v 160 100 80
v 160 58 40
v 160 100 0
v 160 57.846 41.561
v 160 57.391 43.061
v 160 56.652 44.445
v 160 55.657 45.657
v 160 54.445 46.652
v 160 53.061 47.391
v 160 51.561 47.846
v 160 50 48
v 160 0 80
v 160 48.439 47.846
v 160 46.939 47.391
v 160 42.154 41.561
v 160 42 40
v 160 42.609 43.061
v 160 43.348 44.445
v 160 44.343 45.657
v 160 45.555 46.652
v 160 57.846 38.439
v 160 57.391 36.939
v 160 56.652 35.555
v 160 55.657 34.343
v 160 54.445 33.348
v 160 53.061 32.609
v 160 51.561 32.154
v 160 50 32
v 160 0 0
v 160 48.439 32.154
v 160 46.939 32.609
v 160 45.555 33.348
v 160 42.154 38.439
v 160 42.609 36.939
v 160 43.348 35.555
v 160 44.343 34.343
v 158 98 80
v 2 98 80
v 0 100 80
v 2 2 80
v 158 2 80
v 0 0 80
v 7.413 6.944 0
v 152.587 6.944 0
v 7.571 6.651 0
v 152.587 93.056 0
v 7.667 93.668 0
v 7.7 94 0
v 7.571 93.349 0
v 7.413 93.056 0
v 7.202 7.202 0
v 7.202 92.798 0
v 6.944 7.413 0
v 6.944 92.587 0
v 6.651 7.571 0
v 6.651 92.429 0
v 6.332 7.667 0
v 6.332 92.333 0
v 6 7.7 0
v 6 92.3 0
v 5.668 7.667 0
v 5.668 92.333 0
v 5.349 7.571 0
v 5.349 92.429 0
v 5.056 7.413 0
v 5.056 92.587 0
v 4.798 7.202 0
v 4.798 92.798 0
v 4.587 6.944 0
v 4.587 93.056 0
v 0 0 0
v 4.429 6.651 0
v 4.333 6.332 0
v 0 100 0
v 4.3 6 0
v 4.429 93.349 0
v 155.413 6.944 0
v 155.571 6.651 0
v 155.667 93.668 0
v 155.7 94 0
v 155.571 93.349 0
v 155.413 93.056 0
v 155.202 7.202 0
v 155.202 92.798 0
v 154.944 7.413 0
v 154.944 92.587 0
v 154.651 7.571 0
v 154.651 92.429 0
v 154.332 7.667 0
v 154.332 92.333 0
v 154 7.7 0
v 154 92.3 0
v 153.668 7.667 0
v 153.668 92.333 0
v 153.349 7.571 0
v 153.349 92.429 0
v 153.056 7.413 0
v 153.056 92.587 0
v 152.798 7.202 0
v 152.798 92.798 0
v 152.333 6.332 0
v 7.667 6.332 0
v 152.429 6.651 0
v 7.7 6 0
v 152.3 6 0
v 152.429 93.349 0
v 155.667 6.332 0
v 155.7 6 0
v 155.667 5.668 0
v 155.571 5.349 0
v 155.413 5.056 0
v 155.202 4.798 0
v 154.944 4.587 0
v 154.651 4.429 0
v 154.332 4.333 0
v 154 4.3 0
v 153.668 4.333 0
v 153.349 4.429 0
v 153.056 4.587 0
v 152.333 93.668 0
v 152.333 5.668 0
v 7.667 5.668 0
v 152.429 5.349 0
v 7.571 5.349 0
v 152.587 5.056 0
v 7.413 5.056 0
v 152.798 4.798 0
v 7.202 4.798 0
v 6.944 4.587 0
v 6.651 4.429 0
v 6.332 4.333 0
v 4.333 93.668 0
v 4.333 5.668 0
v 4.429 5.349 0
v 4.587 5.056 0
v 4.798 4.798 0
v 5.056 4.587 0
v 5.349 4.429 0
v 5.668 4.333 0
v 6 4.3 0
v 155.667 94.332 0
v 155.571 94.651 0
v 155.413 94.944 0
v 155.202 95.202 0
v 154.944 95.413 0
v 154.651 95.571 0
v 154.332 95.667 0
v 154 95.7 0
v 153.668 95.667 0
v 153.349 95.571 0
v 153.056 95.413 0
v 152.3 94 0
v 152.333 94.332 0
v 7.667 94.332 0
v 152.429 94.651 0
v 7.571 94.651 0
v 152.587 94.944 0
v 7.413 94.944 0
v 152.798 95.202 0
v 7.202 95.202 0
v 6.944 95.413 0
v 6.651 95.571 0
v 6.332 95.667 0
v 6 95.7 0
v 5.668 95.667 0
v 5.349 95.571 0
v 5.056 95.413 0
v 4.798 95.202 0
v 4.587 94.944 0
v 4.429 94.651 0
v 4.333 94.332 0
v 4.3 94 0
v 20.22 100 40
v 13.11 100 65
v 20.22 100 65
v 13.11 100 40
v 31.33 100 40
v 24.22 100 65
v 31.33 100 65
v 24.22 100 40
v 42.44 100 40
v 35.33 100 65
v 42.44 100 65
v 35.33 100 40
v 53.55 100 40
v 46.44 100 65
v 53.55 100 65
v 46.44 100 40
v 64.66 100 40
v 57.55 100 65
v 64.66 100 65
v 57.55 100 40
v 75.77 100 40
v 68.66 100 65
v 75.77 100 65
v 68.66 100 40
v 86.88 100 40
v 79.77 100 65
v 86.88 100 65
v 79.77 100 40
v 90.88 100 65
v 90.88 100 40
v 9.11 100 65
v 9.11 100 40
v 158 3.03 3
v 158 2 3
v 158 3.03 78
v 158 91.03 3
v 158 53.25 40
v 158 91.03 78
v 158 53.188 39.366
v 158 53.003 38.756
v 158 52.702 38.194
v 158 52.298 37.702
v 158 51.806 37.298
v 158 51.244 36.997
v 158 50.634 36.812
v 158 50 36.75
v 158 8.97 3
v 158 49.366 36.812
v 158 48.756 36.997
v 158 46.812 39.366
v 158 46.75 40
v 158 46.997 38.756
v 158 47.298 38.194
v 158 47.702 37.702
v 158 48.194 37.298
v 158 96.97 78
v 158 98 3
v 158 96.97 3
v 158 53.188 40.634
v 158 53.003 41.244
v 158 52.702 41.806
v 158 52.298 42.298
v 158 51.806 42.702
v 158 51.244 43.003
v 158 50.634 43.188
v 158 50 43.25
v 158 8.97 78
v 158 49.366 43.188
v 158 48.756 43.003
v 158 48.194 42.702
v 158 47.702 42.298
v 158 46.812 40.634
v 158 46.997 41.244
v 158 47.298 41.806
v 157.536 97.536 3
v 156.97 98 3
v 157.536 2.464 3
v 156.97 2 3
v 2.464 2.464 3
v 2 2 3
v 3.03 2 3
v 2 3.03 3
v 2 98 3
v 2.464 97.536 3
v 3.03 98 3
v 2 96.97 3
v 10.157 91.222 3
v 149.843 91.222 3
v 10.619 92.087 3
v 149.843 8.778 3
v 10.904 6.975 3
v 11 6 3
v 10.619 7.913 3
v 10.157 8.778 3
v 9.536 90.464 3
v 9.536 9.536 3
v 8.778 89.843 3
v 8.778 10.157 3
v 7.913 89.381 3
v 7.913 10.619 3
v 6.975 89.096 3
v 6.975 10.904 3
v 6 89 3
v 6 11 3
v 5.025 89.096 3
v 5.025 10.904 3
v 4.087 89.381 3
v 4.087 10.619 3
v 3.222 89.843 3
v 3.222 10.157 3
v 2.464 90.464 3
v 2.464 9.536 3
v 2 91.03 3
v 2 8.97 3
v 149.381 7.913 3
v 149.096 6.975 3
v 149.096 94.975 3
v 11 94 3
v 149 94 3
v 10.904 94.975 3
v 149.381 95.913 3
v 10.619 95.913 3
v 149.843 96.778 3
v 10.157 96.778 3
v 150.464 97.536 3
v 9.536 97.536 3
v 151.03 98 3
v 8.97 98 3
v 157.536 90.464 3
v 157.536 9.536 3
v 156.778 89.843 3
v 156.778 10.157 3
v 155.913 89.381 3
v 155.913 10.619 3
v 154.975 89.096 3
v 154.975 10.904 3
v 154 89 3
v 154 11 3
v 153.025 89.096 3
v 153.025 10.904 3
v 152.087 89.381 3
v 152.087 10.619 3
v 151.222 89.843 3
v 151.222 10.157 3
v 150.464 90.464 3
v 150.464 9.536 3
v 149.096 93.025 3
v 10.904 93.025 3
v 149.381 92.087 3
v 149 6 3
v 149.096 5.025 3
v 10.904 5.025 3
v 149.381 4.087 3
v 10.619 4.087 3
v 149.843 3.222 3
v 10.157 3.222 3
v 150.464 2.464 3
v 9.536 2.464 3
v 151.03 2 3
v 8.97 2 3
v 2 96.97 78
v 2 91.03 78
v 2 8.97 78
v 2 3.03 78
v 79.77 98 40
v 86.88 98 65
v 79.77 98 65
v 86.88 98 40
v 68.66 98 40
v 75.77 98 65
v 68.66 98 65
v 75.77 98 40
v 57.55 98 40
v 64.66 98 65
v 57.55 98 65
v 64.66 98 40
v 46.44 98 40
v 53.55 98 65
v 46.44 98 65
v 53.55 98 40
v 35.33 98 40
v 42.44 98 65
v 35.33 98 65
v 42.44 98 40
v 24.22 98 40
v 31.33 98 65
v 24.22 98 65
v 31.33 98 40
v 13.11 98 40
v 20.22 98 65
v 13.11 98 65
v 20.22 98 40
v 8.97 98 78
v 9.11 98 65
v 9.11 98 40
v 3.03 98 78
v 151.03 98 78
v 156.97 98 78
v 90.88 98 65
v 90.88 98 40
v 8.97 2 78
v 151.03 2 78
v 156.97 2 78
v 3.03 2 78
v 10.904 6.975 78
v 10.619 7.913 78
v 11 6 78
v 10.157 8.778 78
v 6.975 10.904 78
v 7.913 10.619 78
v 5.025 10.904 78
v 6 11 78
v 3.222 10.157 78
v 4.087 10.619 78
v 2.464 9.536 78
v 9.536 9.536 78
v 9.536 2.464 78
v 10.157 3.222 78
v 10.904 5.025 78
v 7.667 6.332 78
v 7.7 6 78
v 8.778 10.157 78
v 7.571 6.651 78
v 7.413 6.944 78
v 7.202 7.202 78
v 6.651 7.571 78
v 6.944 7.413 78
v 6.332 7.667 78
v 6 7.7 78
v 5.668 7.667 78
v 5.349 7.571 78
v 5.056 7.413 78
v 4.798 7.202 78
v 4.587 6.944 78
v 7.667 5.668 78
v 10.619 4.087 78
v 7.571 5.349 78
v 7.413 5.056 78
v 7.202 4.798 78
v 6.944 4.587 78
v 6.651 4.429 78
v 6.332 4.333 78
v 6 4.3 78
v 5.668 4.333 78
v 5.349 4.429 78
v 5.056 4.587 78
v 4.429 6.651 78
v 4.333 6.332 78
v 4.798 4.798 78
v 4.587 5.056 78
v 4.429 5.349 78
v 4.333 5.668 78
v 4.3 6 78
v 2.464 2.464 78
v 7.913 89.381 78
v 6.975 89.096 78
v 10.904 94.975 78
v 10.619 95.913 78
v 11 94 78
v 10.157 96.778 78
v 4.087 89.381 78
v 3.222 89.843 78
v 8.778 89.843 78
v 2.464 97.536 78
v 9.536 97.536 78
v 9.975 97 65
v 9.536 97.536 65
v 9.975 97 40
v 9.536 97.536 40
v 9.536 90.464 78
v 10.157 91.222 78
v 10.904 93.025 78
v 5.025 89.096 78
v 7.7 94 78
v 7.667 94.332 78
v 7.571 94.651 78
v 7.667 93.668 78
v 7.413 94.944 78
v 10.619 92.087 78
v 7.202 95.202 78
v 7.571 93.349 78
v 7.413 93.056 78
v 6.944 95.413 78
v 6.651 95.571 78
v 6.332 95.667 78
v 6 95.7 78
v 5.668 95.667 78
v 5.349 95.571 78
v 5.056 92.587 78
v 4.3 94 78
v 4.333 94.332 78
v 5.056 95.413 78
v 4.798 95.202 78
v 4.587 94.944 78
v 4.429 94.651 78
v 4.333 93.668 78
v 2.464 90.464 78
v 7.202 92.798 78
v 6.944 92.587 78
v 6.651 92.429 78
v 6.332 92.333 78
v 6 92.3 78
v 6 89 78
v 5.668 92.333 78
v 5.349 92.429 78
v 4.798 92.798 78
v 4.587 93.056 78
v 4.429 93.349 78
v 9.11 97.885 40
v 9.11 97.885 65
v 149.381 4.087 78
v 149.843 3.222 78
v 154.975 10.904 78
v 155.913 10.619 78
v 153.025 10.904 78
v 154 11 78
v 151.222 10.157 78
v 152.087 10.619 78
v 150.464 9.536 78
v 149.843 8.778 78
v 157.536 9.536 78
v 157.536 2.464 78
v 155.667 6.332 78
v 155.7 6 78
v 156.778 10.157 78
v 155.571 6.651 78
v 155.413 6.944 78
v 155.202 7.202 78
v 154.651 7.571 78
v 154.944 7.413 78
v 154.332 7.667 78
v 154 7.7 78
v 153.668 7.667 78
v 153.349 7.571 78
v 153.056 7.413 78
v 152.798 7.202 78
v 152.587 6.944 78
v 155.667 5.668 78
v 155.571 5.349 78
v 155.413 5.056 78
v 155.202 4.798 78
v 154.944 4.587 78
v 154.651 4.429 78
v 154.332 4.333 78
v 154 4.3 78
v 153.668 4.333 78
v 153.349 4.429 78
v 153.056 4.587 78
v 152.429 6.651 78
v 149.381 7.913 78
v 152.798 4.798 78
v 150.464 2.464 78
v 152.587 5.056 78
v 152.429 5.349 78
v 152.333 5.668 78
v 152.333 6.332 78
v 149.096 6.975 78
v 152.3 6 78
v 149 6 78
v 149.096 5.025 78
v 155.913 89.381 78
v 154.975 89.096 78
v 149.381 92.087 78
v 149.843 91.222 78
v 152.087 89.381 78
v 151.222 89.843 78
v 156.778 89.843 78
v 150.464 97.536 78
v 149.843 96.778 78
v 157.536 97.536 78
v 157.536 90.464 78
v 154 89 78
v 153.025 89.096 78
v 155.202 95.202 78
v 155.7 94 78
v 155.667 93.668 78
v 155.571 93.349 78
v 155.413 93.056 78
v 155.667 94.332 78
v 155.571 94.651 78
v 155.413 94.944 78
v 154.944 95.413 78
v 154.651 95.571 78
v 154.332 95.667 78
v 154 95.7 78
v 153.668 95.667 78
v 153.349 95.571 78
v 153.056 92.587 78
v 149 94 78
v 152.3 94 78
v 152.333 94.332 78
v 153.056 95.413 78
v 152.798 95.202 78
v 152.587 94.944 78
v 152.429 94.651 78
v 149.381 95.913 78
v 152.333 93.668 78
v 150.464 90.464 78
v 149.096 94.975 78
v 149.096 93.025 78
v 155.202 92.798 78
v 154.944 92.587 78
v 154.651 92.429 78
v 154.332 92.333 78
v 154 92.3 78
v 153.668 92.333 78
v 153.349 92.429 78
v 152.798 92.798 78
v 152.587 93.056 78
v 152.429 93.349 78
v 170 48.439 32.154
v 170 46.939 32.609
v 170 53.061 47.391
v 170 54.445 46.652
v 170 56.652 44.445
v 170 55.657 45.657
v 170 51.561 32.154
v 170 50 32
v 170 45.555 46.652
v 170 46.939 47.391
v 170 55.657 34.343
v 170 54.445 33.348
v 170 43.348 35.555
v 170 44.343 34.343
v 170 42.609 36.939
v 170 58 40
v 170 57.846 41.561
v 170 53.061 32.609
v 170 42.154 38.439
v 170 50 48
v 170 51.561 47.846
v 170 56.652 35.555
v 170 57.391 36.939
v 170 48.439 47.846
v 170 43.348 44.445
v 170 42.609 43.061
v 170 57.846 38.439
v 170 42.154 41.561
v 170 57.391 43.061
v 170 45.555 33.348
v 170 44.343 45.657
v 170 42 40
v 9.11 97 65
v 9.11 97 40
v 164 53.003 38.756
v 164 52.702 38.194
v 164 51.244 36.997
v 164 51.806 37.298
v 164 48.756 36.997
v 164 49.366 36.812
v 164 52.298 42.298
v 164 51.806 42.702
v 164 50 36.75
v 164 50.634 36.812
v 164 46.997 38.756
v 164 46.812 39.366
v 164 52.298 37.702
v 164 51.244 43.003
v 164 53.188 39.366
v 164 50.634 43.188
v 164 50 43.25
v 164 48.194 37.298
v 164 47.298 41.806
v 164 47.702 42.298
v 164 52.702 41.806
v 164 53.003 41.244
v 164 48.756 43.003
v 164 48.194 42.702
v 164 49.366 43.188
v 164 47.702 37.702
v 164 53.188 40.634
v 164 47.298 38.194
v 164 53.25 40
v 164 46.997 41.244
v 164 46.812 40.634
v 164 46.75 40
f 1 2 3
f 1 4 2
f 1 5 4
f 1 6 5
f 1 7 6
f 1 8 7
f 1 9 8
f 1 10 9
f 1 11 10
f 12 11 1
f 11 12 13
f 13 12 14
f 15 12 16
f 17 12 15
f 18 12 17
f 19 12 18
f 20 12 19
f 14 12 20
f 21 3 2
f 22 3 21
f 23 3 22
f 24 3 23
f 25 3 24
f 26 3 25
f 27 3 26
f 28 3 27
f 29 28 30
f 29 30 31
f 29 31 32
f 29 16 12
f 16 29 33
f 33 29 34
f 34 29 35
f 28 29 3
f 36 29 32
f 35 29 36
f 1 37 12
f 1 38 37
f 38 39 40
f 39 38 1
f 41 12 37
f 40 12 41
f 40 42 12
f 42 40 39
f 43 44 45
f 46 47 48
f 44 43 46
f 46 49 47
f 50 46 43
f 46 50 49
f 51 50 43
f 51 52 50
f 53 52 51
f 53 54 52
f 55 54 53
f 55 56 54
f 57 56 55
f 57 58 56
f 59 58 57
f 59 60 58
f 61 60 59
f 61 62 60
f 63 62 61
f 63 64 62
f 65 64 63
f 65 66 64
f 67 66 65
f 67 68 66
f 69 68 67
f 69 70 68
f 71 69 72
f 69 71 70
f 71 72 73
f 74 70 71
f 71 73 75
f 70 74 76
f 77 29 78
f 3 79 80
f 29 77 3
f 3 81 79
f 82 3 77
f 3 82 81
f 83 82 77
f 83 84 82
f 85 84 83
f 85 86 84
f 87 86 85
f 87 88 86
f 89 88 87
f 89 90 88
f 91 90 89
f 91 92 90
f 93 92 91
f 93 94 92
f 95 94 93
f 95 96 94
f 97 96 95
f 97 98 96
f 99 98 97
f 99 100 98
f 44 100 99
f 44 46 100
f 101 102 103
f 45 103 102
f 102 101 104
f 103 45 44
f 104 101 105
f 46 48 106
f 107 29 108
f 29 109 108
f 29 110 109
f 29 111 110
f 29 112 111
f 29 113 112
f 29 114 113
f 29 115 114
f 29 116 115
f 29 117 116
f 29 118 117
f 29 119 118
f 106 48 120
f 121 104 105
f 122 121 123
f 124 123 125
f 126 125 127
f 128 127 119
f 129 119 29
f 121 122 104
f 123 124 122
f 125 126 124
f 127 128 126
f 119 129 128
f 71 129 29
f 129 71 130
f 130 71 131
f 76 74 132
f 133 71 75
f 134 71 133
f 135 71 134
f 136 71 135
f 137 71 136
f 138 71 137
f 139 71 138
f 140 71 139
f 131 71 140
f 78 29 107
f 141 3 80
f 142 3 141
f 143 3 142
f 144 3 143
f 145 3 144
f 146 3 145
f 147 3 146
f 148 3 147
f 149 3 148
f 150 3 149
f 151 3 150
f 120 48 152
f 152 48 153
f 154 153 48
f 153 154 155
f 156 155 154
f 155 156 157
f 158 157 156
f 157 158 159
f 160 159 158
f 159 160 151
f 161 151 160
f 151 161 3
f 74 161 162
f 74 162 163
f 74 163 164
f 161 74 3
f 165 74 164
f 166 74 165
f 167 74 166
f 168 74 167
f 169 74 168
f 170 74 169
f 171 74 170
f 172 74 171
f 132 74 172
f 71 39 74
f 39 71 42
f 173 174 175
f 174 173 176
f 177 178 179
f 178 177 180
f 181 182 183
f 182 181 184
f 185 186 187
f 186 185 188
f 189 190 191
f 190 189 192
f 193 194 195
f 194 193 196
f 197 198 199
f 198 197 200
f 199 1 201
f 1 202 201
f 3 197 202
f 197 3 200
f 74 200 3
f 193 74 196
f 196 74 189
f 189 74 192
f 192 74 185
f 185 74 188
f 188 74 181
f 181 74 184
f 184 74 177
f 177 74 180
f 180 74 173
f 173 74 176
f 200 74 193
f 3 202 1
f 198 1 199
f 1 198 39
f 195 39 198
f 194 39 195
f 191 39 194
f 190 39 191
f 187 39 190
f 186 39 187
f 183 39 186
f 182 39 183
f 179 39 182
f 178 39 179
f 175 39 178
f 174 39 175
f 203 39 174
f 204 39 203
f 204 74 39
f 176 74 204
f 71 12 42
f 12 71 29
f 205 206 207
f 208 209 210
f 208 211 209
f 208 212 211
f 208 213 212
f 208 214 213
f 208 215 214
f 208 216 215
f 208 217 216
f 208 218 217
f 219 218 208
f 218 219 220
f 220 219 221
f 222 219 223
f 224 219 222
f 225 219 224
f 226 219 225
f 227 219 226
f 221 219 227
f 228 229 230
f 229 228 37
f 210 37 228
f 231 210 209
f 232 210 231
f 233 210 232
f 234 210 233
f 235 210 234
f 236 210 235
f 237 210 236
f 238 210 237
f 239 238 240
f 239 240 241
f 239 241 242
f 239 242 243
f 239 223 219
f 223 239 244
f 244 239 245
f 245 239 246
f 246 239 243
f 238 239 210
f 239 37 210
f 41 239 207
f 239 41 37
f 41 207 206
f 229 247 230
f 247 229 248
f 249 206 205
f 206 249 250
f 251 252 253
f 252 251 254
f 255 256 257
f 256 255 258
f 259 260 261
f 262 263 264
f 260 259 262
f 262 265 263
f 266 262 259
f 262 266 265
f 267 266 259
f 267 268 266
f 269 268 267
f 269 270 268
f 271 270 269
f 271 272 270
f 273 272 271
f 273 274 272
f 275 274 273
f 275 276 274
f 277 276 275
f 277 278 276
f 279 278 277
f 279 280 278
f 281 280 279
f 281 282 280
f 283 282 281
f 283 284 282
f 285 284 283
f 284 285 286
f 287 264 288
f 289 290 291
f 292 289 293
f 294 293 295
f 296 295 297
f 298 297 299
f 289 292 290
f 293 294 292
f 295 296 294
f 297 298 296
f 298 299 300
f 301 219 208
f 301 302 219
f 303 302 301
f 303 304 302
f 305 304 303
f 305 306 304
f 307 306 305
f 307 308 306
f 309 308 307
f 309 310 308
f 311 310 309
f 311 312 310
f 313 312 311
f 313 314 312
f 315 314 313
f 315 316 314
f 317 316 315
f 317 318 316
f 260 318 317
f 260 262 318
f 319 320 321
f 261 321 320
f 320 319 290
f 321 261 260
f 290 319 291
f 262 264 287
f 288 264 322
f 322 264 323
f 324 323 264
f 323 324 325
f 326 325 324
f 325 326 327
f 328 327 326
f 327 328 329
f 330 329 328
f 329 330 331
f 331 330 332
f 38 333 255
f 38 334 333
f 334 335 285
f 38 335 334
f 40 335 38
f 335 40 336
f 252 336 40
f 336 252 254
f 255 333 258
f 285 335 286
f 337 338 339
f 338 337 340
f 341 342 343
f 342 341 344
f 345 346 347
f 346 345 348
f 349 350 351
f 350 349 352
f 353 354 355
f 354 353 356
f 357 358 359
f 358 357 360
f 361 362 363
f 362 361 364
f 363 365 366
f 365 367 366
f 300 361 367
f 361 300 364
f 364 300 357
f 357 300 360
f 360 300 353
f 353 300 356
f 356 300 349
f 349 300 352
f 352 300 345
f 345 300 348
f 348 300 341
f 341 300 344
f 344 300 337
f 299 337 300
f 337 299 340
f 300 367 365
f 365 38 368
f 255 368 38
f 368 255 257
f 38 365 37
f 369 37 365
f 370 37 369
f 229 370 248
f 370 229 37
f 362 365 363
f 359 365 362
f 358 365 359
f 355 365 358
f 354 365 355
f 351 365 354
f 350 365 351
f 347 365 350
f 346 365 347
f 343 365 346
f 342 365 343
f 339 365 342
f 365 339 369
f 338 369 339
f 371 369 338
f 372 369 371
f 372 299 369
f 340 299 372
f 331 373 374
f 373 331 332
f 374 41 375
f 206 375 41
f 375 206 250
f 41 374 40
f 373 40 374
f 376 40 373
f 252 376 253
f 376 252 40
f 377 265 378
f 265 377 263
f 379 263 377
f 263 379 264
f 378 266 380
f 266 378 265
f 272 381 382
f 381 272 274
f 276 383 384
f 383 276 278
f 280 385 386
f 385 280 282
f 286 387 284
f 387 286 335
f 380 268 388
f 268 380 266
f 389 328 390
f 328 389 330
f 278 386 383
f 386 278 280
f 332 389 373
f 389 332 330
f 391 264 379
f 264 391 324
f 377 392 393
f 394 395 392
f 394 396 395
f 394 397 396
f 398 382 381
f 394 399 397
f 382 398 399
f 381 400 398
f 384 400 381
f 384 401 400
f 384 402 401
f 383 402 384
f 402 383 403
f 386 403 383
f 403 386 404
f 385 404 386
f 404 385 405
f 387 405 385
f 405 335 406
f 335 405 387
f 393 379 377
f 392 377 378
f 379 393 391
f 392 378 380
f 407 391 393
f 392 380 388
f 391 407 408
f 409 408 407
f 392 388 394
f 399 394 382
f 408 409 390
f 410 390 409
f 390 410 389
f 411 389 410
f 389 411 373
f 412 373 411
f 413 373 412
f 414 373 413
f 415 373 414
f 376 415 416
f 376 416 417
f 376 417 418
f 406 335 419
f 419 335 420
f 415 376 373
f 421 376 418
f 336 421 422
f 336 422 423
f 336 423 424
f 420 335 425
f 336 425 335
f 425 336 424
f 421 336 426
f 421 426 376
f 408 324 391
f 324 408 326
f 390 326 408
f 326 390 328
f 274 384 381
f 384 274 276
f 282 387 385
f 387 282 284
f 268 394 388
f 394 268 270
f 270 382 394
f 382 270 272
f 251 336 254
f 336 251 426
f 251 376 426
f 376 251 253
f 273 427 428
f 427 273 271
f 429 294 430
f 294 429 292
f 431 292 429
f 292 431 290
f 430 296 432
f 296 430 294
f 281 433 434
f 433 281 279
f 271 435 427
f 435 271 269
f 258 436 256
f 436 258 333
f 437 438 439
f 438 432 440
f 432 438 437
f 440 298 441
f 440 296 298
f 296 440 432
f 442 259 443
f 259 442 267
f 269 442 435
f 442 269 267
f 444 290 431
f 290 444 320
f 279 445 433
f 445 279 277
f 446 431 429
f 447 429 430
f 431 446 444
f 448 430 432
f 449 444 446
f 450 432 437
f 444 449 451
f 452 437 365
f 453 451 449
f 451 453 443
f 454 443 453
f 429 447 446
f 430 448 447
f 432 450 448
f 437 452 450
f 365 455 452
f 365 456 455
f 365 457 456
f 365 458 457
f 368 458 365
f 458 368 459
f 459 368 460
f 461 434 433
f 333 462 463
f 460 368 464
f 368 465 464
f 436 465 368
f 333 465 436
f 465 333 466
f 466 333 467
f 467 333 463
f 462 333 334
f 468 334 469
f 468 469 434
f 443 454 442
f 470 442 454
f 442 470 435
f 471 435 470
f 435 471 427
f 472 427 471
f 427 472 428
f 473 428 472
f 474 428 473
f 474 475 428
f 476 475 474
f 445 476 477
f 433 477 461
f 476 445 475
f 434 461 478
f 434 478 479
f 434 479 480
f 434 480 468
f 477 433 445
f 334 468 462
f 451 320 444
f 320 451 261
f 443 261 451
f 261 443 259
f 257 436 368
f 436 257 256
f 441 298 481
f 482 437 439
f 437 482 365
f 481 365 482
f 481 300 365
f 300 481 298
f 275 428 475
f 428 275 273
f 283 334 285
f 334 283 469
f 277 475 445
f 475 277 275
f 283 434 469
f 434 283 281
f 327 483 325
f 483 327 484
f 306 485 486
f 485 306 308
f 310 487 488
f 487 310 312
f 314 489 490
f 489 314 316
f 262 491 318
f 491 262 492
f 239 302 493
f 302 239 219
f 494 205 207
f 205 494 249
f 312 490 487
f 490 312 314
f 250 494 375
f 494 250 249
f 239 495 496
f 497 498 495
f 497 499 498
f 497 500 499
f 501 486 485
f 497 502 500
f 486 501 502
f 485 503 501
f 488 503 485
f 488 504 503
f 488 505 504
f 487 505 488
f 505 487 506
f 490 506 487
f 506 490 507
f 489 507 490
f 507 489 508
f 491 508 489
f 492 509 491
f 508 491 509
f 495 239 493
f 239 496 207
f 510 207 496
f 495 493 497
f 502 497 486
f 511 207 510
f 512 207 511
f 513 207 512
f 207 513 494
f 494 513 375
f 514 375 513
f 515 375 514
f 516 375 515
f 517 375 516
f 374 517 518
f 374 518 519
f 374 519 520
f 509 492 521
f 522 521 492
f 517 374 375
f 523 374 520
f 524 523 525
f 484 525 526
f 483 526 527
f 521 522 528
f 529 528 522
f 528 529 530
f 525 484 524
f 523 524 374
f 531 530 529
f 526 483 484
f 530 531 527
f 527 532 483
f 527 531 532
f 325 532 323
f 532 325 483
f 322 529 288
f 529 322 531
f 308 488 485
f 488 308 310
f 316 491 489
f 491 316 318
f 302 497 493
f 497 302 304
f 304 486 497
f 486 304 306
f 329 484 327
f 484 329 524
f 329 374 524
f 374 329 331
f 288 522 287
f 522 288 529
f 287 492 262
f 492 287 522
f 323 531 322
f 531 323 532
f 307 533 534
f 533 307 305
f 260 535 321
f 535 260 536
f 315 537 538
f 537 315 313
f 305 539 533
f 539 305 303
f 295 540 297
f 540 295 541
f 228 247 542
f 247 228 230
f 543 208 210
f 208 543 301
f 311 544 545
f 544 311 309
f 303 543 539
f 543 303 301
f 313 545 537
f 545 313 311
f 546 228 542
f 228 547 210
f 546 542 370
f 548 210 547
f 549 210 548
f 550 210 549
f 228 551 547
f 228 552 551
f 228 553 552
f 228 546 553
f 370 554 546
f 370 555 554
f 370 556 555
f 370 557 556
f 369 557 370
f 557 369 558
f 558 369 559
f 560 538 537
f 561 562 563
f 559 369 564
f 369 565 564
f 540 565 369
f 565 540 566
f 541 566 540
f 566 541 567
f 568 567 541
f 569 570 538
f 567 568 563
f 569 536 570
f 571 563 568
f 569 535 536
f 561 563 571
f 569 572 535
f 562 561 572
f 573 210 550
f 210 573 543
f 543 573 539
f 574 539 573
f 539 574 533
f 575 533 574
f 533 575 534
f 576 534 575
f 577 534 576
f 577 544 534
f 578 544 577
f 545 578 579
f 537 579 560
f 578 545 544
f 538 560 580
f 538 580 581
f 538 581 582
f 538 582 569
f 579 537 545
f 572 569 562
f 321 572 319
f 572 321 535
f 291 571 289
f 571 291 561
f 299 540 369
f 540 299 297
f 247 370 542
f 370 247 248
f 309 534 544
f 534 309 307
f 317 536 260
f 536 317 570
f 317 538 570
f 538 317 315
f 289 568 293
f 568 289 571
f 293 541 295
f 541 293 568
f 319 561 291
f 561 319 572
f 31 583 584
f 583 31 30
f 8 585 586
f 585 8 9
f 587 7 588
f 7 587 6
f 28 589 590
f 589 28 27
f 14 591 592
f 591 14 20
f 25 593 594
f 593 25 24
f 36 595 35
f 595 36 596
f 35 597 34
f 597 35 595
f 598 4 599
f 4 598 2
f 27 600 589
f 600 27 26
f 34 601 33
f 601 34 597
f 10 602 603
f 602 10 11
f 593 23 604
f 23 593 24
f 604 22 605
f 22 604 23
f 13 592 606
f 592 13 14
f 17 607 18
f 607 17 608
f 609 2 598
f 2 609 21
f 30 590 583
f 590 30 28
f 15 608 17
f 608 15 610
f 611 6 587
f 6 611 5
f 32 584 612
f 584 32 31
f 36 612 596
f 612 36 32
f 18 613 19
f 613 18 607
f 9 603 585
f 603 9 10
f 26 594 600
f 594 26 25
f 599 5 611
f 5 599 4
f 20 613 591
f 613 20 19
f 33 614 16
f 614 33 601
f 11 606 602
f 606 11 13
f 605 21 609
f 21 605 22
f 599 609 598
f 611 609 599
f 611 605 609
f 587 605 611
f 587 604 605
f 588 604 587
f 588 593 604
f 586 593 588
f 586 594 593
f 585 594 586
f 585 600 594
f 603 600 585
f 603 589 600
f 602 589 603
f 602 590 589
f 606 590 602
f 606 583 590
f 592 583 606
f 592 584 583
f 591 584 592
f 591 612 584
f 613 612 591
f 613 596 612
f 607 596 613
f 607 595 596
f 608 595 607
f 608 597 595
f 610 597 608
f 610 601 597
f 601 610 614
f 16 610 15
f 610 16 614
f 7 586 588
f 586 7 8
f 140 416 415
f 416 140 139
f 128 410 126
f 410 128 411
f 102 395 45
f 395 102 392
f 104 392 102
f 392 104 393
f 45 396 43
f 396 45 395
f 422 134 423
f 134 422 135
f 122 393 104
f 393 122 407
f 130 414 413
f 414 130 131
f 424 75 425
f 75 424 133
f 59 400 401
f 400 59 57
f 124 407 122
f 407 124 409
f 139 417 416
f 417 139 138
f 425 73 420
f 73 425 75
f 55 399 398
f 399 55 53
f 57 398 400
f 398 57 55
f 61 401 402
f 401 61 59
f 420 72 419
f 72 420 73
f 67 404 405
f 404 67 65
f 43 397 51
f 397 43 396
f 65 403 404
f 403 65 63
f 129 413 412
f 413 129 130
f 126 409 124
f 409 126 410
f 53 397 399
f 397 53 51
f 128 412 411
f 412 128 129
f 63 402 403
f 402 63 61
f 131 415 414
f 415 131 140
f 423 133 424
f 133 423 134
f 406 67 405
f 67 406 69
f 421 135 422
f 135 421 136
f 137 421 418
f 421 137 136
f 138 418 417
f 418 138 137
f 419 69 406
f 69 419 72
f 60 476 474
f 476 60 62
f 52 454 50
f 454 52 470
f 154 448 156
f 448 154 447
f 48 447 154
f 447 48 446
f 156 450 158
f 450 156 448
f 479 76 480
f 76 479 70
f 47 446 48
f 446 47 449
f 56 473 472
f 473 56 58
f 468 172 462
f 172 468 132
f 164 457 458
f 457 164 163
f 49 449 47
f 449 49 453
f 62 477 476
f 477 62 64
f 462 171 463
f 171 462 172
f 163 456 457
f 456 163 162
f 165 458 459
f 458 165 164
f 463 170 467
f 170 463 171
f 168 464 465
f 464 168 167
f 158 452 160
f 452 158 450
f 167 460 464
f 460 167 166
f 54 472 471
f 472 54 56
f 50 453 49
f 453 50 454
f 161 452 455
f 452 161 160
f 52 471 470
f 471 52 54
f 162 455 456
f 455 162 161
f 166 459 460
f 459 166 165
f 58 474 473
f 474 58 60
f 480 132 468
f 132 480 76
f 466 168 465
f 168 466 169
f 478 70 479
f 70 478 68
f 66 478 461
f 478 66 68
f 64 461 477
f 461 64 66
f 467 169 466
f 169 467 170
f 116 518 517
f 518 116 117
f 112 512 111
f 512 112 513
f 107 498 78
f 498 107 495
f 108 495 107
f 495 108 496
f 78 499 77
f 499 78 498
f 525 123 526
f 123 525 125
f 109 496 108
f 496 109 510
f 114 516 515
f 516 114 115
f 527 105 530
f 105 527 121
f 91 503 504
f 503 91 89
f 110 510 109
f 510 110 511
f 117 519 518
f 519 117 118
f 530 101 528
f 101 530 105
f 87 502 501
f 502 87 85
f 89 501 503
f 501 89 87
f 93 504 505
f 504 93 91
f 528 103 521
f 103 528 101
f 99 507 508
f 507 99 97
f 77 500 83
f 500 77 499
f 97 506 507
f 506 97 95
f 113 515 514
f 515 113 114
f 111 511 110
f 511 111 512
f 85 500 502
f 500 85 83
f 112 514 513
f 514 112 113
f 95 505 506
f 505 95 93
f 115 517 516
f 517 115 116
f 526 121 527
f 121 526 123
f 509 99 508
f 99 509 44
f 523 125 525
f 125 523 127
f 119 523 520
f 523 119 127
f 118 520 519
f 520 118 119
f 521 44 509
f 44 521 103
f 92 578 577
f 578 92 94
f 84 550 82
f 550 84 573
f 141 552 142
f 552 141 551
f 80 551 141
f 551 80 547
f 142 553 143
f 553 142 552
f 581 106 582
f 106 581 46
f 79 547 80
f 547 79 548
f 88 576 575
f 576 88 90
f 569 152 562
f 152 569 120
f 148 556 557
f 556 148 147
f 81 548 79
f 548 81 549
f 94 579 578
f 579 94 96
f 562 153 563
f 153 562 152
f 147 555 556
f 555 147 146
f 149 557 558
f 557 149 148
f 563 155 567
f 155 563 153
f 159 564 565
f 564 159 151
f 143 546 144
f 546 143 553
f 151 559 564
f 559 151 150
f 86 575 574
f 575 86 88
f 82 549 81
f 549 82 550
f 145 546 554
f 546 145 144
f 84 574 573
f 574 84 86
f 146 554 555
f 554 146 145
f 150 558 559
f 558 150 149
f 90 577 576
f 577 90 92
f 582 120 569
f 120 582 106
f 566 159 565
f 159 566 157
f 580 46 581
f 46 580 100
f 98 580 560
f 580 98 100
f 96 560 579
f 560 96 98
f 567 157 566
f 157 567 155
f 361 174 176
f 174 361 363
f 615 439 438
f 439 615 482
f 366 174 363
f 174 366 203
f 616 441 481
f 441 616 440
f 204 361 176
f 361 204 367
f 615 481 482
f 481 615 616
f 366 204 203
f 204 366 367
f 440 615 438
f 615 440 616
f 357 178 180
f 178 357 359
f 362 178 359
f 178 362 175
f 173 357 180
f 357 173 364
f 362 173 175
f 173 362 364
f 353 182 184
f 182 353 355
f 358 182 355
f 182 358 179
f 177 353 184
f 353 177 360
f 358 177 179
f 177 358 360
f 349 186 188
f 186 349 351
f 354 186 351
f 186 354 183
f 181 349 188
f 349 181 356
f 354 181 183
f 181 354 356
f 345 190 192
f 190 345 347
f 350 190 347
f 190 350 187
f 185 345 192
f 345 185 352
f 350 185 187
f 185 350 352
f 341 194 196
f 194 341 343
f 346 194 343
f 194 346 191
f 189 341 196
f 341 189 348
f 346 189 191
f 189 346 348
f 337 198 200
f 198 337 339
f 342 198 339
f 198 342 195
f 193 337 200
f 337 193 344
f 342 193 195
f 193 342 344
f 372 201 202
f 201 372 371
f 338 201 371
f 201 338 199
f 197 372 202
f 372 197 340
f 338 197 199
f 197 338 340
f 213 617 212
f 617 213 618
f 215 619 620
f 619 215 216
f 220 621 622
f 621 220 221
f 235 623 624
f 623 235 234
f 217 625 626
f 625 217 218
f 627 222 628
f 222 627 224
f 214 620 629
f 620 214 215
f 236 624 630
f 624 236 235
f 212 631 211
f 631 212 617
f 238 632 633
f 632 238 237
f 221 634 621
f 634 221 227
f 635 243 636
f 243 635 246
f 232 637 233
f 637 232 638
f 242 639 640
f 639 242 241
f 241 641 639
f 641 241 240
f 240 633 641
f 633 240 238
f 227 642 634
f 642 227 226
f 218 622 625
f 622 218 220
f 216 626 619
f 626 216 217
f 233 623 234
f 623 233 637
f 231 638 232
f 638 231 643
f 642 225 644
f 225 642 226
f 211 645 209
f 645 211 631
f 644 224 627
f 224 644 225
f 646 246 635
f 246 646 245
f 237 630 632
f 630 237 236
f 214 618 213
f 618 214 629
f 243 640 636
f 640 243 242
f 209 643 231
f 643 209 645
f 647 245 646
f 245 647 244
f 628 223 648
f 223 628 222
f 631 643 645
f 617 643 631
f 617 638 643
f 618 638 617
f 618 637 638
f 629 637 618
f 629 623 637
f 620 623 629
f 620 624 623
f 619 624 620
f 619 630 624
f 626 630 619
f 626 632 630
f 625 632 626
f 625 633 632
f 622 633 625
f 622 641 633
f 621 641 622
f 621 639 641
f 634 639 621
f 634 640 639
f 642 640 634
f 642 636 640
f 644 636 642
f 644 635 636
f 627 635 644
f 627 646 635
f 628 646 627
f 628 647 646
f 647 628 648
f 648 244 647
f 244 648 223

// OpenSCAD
$fn = 32;

// ----------------------------------------------------------------------
// Enclosure body: 160 x 100 x 80 mm, wall 2 mm
// ----------------------------------------------------------------------

// --- parameters (mm) ---
length = 160;             // outside length, X
width = 100;              // outside width, Y
height = 80;              // outside height, Z
wall = 2;                 // side wall thickness
floor_t = 3;              // floor thickness
boss_d = 10;              // corner boss diameter
boss_h = 75;              // corner boss height above the floor
boss_hole_d = 3.4;        // lid screw clearance in the boss
boss_lip = 6;             // boss centre inset from the corner
vent_slots = 8;           // vent slots in the long wall
vent_w = 4;               // vent slot width
vent_h = 25;              // vent slot height
vent_pitch = 11.11;       // vent slot pitch
vent_z = 40;              // vent slot sill height
nipple_d = 16;            // cable gland boss diameter
nipple_h = 10;            // cable gland boss height
nipple_bore = 6.5;        // cable gland bore

module shell() {
  difference() {
    cube([length, width, height]);
    /* hollow, open at the top */
    translate([wall, wall, floor_t])
      cube([length - 2 * wall, width - 2 * wall, height]);
  }
}

module bosses() {
  /* corner bosses, sunk 1 mm into the floor */
  for (sx = [0, 1]) for (sy = [0, 1])
    translate([sx * (length - 2 * boss_lip) + boss_lip, sy * (width - 2 * boss_lip) + boss_lip, floor_t - 1])
      cylinder(h = boss_h + 1, d = boss_d);
}

module gland() {
  /* boss on the short wall, sunk 1 mm into it */
  translate([length - 1, width / 2, height * 0.5]) rotate([0, 90, 0])
    cylinder(h = nipple_h + 1, d = nipple_d);
}

difference() {
  union() {
    shell();
    bosses();
    gland();
  }
  /* boss screw holes */
  for (sx = [0, 1]) for (sy = [0, 1])
    translate([sx * (length - 2 * boss_lip) + boss_lip, sy * (width - 2 * boss_lip) + boss_lip, -1]) cylinder(h = floor_t + boss_h + 2, d = boss_hole_d);
  /* vent grille in the +Y wall */
  for (i = [0 : vent_slots - 1]) translate([vent_pitch * (i + 1) - vent_w / 2, width - wall - 1, vent_z]) cube([vent_w, wall + 2, vent_h]);
  translate([length, width / 2, height * 0.5]) rotate([0, 90, 0]) translate([0, 0, -nipple_h - 2]) cylinder(h = nipple_h + wall + 4, d = nipple_bore);
}
